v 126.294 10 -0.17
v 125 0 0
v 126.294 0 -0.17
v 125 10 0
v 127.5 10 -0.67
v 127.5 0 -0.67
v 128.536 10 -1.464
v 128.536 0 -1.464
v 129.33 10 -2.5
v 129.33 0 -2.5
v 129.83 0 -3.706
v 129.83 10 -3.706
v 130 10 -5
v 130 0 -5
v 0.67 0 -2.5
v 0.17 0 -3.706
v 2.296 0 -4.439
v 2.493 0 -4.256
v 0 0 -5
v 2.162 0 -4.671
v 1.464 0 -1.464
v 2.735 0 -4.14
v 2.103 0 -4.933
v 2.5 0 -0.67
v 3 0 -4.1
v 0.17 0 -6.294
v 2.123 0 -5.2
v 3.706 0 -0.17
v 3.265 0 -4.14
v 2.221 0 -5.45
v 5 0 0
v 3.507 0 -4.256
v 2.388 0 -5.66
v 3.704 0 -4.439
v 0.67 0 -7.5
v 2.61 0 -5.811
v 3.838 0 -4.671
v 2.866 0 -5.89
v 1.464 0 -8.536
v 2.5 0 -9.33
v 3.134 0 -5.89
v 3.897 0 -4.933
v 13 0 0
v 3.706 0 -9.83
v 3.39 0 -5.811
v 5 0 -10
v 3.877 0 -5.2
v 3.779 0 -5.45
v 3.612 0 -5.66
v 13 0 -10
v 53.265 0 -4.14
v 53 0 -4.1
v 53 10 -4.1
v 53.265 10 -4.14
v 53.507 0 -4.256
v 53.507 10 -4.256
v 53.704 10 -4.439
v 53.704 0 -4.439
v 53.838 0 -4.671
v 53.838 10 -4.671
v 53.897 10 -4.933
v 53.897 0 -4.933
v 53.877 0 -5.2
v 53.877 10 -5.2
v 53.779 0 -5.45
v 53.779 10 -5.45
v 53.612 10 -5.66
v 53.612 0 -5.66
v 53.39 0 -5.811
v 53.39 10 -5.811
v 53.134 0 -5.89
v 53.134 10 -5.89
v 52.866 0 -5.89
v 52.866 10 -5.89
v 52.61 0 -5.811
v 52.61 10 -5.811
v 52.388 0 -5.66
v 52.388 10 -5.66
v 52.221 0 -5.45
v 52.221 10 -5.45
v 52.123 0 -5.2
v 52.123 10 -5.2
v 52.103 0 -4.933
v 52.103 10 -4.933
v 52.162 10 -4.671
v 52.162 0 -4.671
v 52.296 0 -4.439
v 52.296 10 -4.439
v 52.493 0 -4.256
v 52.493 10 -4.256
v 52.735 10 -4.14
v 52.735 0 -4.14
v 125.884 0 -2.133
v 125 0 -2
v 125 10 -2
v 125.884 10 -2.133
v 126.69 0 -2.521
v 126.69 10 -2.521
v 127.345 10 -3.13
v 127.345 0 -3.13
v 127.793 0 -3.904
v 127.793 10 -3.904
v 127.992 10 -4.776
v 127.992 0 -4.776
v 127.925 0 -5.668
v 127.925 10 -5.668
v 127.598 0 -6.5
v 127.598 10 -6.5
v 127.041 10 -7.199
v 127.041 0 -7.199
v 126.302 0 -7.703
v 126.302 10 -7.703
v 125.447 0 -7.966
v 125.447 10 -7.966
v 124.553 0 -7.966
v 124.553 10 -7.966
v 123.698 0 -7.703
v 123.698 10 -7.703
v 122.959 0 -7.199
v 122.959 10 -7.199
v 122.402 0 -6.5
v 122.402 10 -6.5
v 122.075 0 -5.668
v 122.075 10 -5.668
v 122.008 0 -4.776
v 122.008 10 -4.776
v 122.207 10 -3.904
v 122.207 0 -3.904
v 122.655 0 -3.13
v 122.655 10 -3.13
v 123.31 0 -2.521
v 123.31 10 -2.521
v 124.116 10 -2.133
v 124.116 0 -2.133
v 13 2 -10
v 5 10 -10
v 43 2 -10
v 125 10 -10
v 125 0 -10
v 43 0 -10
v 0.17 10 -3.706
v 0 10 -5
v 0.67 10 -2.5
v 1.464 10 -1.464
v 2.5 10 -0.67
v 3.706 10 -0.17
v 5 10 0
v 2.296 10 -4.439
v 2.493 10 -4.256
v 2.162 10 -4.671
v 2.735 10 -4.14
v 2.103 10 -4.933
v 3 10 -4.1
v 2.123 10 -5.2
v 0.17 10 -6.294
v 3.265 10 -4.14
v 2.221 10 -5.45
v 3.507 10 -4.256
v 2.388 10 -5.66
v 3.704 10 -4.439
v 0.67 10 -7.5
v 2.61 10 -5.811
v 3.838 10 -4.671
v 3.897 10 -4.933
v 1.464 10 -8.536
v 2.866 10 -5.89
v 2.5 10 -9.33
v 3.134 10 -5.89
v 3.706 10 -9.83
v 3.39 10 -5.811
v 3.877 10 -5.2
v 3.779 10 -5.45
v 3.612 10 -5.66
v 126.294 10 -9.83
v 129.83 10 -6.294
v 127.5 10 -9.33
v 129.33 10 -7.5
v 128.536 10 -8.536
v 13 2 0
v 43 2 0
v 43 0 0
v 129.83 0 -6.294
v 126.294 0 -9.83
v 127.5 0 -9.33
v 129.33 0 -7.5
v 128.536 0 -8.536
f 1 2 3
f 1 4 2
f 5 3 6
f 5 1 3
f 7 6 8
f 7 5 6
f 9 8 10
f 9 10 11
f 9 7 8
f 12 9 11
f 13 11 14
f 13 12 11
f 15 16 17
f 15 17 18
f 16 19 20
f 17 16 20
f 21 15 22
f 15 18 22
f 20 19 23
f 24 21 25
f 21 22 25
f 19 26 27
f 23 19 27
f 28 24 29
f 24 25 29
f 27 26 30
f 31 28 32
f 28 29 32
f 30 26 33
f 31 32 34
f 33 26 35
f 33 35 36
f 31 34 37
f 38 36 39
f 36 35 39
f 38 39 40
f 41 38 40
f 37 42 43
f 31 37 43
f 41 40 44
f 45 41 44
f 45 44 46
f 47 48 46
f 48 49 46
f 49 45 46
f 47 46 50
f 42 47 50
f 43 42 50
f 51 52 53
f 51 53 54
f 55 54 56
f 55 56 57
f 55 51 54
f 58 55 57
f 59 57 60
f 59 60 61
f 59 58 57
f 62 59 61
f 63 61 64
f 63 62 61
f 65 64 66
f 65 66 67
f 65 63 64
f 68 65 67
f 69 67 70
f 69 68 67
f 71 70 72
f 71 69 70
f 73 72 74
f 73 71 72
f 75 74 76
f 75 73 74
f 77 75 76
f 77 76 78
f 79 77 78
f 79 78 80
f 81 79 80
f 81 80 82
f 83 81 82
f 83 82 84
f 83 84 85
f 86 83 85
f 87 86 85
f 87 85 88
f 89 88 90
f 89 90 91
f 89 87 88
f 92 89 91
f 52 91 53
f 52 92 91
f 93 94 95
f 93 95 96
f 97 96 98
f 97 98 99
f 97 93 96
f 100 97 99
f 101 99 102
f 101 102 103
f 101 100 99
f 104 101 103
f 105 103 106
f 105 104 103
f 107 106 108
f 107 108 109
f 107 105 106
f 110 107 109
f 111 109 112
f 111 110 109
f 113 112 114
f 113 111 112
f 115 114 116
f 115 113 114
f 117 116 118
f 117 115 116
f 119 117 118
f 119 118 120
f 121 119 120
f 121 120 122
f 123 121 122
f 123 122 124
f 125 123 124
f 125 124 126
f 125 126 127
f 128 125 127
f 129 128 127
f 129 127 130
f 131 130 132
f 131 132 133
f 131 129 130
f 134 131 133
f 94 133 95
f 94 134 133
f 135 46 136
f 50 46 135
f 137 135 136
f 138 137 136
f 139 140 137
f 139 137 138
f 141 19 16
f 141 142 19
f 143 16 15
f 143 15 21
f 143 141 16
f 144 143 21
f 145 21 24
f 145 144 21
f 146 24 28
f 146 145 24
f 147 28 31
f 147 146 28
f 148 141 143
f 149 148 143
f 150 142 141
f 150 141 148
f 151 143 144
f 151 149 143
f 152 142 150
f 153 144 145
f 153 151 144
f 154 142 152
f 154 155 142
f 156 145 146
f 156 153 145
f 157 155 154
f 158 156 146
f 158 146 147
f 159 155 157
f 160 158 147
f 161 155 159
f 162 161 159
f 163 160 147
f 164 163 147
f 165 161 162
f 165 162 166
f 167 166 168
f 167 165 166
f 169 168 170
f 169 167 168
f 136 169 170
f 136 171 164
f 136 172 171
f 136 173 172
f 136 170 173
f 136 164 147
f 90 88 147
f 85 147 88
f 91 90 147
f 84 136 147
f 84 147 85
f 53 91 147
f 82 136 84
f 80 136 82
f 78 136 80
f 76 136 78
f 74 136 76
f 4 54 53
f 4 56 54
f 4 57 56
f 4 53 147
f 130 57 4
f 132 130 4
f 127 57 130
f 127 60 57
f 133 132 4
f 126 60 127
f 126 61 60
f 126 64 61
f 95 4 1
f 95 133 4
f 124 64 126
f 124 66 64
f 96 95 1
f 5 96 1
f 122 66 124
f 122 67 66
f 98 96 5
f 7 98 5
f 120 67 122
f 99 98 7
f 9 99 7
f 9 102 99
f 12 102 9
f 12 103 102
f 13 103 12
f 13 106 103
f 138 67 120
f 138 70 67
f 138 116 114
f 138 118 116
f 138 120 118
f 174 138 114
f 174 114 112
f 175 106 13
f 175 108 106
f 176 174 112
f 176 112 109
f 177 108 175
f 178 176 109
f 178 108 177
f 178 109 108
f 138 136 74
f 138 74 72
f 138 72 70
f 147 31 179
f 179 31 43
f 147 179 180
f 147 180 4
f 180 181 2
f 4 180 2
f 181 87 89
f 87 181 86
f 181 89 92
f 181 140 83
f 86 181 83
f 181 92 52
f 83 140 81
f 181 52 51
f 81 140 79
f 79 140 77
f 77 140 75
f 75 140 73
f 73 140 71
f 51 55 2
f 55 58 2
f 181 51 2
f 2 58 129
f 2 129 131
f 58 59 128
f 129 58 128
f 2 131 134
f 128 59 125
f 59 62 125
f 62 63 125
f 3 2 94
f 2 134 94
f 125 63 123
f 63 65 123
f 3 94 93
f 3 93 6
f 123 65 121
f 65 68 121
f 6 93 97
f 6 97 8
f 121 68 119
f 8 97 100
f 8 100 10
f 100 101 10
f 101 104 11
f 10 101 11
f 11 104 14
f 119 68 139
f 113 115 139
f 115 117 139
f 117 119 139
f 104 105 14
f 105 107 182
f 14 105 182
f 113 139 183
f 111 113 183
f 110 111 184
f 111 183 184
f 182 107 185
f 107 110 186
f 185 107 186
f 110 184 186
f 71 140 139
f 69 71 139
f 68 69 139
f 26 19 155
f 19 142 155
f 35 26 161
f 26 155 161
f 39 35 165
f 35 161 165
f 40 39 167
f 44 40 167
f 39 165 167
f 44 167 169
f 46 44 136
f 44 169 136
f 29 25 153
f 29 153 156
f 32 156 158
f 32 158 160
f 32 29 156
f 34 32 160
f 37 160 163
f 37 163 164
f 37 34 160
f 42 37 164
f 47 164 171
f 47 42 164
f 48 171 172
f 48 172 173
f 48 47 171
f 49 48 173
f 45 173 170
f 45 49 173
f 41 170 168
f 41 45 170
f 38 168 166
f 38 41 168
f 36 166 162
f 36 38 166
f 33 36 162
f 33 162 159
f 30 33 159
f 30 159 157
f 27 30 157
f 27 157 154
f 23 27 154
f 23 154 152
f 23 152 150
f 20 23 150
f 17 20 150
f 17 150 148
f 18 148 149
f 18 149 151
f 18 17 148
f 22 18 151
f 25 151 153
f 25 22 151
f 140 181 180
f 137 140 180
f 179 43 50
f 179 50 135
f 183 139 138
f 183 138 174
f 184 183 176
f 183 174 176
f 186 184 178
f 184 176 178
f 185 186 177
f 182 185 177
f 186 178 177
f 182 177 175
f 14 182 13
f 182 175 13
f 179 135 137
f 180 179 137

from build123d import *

# Parameters (mm, degrees)
SKETCH1_W               = 130
SKETCH1_H               = 10
SKETCH1_R               = 0.9
SKETCH1_R_2             = 3
BOSS_EXTRUDE1_DEPTH     = 10
CUT_EXTRUDE1_DEPTH      = 131.766968306
CUT_EXTRUDE1_DEPTH_BACK = 131.766968306
SKETCH2_W               = 30
SKETCH2_H               = 2
FILLET1_R               = 5


with BuildPart() as part:
    # Sketch1 → Boss-Extrude1 (new body)
    with BuildSketch(Plane(origin=(0, 0, 0), x_dir=(1, 0, 0), z_dir=(0, 1, 0))):
        with Locations((65, 5)):
            Rectangle(SKETCH1_W, SKETCH1_H)
        with Locations(Location((3, 5, 0), (0, 0, 270))):
            Circle(SKETCH1_R, mode=Mode.SUBTRACT)
        with Locations(Location((53, 5, 0), (0, 0, 270))):
            Circle(SKETCH1_R, mode=Mode.SUBTRACT)
        with Locations(Location((125, 5, 0), (0, 0, 270))):
            Circle(SKETCH1_R_2, mode=Mode.SUBTRACT)
    extrude(amount=BOSS_EXTRUDE1_DEPTH)

    # Sketch2 → Cut-Extrude1 (cut, two sides: drawn at the far end of the back side and taken through both)
    with BuildSketch(Plane.XY.offset(-CUT_EXTRUDE1_DEPTH_BACK)):
        with Locations((28, 1)):
            Rectangle(SKETCH2_W, SKETCH2_H)
    extrude(amount=CUT_EXTRUDE1_DEPTH + CUT_EXTRUDE1_DEPTH_BACK, mode=Mode.SUBTRACT)

    # Fillet1
    fillet1_edges = [part.edges().sort_by_distance(p)[0] for p in [
        (130, 5, 0),
        (130, 5, -10),
        (0, 5, 0),
        (0, 5, -10),
    ]]
    fillet(fillet1_edges, radius=FILLET1_R - 0.0001)  # a hair under: the kernel refuses the full size


solid = part.part
